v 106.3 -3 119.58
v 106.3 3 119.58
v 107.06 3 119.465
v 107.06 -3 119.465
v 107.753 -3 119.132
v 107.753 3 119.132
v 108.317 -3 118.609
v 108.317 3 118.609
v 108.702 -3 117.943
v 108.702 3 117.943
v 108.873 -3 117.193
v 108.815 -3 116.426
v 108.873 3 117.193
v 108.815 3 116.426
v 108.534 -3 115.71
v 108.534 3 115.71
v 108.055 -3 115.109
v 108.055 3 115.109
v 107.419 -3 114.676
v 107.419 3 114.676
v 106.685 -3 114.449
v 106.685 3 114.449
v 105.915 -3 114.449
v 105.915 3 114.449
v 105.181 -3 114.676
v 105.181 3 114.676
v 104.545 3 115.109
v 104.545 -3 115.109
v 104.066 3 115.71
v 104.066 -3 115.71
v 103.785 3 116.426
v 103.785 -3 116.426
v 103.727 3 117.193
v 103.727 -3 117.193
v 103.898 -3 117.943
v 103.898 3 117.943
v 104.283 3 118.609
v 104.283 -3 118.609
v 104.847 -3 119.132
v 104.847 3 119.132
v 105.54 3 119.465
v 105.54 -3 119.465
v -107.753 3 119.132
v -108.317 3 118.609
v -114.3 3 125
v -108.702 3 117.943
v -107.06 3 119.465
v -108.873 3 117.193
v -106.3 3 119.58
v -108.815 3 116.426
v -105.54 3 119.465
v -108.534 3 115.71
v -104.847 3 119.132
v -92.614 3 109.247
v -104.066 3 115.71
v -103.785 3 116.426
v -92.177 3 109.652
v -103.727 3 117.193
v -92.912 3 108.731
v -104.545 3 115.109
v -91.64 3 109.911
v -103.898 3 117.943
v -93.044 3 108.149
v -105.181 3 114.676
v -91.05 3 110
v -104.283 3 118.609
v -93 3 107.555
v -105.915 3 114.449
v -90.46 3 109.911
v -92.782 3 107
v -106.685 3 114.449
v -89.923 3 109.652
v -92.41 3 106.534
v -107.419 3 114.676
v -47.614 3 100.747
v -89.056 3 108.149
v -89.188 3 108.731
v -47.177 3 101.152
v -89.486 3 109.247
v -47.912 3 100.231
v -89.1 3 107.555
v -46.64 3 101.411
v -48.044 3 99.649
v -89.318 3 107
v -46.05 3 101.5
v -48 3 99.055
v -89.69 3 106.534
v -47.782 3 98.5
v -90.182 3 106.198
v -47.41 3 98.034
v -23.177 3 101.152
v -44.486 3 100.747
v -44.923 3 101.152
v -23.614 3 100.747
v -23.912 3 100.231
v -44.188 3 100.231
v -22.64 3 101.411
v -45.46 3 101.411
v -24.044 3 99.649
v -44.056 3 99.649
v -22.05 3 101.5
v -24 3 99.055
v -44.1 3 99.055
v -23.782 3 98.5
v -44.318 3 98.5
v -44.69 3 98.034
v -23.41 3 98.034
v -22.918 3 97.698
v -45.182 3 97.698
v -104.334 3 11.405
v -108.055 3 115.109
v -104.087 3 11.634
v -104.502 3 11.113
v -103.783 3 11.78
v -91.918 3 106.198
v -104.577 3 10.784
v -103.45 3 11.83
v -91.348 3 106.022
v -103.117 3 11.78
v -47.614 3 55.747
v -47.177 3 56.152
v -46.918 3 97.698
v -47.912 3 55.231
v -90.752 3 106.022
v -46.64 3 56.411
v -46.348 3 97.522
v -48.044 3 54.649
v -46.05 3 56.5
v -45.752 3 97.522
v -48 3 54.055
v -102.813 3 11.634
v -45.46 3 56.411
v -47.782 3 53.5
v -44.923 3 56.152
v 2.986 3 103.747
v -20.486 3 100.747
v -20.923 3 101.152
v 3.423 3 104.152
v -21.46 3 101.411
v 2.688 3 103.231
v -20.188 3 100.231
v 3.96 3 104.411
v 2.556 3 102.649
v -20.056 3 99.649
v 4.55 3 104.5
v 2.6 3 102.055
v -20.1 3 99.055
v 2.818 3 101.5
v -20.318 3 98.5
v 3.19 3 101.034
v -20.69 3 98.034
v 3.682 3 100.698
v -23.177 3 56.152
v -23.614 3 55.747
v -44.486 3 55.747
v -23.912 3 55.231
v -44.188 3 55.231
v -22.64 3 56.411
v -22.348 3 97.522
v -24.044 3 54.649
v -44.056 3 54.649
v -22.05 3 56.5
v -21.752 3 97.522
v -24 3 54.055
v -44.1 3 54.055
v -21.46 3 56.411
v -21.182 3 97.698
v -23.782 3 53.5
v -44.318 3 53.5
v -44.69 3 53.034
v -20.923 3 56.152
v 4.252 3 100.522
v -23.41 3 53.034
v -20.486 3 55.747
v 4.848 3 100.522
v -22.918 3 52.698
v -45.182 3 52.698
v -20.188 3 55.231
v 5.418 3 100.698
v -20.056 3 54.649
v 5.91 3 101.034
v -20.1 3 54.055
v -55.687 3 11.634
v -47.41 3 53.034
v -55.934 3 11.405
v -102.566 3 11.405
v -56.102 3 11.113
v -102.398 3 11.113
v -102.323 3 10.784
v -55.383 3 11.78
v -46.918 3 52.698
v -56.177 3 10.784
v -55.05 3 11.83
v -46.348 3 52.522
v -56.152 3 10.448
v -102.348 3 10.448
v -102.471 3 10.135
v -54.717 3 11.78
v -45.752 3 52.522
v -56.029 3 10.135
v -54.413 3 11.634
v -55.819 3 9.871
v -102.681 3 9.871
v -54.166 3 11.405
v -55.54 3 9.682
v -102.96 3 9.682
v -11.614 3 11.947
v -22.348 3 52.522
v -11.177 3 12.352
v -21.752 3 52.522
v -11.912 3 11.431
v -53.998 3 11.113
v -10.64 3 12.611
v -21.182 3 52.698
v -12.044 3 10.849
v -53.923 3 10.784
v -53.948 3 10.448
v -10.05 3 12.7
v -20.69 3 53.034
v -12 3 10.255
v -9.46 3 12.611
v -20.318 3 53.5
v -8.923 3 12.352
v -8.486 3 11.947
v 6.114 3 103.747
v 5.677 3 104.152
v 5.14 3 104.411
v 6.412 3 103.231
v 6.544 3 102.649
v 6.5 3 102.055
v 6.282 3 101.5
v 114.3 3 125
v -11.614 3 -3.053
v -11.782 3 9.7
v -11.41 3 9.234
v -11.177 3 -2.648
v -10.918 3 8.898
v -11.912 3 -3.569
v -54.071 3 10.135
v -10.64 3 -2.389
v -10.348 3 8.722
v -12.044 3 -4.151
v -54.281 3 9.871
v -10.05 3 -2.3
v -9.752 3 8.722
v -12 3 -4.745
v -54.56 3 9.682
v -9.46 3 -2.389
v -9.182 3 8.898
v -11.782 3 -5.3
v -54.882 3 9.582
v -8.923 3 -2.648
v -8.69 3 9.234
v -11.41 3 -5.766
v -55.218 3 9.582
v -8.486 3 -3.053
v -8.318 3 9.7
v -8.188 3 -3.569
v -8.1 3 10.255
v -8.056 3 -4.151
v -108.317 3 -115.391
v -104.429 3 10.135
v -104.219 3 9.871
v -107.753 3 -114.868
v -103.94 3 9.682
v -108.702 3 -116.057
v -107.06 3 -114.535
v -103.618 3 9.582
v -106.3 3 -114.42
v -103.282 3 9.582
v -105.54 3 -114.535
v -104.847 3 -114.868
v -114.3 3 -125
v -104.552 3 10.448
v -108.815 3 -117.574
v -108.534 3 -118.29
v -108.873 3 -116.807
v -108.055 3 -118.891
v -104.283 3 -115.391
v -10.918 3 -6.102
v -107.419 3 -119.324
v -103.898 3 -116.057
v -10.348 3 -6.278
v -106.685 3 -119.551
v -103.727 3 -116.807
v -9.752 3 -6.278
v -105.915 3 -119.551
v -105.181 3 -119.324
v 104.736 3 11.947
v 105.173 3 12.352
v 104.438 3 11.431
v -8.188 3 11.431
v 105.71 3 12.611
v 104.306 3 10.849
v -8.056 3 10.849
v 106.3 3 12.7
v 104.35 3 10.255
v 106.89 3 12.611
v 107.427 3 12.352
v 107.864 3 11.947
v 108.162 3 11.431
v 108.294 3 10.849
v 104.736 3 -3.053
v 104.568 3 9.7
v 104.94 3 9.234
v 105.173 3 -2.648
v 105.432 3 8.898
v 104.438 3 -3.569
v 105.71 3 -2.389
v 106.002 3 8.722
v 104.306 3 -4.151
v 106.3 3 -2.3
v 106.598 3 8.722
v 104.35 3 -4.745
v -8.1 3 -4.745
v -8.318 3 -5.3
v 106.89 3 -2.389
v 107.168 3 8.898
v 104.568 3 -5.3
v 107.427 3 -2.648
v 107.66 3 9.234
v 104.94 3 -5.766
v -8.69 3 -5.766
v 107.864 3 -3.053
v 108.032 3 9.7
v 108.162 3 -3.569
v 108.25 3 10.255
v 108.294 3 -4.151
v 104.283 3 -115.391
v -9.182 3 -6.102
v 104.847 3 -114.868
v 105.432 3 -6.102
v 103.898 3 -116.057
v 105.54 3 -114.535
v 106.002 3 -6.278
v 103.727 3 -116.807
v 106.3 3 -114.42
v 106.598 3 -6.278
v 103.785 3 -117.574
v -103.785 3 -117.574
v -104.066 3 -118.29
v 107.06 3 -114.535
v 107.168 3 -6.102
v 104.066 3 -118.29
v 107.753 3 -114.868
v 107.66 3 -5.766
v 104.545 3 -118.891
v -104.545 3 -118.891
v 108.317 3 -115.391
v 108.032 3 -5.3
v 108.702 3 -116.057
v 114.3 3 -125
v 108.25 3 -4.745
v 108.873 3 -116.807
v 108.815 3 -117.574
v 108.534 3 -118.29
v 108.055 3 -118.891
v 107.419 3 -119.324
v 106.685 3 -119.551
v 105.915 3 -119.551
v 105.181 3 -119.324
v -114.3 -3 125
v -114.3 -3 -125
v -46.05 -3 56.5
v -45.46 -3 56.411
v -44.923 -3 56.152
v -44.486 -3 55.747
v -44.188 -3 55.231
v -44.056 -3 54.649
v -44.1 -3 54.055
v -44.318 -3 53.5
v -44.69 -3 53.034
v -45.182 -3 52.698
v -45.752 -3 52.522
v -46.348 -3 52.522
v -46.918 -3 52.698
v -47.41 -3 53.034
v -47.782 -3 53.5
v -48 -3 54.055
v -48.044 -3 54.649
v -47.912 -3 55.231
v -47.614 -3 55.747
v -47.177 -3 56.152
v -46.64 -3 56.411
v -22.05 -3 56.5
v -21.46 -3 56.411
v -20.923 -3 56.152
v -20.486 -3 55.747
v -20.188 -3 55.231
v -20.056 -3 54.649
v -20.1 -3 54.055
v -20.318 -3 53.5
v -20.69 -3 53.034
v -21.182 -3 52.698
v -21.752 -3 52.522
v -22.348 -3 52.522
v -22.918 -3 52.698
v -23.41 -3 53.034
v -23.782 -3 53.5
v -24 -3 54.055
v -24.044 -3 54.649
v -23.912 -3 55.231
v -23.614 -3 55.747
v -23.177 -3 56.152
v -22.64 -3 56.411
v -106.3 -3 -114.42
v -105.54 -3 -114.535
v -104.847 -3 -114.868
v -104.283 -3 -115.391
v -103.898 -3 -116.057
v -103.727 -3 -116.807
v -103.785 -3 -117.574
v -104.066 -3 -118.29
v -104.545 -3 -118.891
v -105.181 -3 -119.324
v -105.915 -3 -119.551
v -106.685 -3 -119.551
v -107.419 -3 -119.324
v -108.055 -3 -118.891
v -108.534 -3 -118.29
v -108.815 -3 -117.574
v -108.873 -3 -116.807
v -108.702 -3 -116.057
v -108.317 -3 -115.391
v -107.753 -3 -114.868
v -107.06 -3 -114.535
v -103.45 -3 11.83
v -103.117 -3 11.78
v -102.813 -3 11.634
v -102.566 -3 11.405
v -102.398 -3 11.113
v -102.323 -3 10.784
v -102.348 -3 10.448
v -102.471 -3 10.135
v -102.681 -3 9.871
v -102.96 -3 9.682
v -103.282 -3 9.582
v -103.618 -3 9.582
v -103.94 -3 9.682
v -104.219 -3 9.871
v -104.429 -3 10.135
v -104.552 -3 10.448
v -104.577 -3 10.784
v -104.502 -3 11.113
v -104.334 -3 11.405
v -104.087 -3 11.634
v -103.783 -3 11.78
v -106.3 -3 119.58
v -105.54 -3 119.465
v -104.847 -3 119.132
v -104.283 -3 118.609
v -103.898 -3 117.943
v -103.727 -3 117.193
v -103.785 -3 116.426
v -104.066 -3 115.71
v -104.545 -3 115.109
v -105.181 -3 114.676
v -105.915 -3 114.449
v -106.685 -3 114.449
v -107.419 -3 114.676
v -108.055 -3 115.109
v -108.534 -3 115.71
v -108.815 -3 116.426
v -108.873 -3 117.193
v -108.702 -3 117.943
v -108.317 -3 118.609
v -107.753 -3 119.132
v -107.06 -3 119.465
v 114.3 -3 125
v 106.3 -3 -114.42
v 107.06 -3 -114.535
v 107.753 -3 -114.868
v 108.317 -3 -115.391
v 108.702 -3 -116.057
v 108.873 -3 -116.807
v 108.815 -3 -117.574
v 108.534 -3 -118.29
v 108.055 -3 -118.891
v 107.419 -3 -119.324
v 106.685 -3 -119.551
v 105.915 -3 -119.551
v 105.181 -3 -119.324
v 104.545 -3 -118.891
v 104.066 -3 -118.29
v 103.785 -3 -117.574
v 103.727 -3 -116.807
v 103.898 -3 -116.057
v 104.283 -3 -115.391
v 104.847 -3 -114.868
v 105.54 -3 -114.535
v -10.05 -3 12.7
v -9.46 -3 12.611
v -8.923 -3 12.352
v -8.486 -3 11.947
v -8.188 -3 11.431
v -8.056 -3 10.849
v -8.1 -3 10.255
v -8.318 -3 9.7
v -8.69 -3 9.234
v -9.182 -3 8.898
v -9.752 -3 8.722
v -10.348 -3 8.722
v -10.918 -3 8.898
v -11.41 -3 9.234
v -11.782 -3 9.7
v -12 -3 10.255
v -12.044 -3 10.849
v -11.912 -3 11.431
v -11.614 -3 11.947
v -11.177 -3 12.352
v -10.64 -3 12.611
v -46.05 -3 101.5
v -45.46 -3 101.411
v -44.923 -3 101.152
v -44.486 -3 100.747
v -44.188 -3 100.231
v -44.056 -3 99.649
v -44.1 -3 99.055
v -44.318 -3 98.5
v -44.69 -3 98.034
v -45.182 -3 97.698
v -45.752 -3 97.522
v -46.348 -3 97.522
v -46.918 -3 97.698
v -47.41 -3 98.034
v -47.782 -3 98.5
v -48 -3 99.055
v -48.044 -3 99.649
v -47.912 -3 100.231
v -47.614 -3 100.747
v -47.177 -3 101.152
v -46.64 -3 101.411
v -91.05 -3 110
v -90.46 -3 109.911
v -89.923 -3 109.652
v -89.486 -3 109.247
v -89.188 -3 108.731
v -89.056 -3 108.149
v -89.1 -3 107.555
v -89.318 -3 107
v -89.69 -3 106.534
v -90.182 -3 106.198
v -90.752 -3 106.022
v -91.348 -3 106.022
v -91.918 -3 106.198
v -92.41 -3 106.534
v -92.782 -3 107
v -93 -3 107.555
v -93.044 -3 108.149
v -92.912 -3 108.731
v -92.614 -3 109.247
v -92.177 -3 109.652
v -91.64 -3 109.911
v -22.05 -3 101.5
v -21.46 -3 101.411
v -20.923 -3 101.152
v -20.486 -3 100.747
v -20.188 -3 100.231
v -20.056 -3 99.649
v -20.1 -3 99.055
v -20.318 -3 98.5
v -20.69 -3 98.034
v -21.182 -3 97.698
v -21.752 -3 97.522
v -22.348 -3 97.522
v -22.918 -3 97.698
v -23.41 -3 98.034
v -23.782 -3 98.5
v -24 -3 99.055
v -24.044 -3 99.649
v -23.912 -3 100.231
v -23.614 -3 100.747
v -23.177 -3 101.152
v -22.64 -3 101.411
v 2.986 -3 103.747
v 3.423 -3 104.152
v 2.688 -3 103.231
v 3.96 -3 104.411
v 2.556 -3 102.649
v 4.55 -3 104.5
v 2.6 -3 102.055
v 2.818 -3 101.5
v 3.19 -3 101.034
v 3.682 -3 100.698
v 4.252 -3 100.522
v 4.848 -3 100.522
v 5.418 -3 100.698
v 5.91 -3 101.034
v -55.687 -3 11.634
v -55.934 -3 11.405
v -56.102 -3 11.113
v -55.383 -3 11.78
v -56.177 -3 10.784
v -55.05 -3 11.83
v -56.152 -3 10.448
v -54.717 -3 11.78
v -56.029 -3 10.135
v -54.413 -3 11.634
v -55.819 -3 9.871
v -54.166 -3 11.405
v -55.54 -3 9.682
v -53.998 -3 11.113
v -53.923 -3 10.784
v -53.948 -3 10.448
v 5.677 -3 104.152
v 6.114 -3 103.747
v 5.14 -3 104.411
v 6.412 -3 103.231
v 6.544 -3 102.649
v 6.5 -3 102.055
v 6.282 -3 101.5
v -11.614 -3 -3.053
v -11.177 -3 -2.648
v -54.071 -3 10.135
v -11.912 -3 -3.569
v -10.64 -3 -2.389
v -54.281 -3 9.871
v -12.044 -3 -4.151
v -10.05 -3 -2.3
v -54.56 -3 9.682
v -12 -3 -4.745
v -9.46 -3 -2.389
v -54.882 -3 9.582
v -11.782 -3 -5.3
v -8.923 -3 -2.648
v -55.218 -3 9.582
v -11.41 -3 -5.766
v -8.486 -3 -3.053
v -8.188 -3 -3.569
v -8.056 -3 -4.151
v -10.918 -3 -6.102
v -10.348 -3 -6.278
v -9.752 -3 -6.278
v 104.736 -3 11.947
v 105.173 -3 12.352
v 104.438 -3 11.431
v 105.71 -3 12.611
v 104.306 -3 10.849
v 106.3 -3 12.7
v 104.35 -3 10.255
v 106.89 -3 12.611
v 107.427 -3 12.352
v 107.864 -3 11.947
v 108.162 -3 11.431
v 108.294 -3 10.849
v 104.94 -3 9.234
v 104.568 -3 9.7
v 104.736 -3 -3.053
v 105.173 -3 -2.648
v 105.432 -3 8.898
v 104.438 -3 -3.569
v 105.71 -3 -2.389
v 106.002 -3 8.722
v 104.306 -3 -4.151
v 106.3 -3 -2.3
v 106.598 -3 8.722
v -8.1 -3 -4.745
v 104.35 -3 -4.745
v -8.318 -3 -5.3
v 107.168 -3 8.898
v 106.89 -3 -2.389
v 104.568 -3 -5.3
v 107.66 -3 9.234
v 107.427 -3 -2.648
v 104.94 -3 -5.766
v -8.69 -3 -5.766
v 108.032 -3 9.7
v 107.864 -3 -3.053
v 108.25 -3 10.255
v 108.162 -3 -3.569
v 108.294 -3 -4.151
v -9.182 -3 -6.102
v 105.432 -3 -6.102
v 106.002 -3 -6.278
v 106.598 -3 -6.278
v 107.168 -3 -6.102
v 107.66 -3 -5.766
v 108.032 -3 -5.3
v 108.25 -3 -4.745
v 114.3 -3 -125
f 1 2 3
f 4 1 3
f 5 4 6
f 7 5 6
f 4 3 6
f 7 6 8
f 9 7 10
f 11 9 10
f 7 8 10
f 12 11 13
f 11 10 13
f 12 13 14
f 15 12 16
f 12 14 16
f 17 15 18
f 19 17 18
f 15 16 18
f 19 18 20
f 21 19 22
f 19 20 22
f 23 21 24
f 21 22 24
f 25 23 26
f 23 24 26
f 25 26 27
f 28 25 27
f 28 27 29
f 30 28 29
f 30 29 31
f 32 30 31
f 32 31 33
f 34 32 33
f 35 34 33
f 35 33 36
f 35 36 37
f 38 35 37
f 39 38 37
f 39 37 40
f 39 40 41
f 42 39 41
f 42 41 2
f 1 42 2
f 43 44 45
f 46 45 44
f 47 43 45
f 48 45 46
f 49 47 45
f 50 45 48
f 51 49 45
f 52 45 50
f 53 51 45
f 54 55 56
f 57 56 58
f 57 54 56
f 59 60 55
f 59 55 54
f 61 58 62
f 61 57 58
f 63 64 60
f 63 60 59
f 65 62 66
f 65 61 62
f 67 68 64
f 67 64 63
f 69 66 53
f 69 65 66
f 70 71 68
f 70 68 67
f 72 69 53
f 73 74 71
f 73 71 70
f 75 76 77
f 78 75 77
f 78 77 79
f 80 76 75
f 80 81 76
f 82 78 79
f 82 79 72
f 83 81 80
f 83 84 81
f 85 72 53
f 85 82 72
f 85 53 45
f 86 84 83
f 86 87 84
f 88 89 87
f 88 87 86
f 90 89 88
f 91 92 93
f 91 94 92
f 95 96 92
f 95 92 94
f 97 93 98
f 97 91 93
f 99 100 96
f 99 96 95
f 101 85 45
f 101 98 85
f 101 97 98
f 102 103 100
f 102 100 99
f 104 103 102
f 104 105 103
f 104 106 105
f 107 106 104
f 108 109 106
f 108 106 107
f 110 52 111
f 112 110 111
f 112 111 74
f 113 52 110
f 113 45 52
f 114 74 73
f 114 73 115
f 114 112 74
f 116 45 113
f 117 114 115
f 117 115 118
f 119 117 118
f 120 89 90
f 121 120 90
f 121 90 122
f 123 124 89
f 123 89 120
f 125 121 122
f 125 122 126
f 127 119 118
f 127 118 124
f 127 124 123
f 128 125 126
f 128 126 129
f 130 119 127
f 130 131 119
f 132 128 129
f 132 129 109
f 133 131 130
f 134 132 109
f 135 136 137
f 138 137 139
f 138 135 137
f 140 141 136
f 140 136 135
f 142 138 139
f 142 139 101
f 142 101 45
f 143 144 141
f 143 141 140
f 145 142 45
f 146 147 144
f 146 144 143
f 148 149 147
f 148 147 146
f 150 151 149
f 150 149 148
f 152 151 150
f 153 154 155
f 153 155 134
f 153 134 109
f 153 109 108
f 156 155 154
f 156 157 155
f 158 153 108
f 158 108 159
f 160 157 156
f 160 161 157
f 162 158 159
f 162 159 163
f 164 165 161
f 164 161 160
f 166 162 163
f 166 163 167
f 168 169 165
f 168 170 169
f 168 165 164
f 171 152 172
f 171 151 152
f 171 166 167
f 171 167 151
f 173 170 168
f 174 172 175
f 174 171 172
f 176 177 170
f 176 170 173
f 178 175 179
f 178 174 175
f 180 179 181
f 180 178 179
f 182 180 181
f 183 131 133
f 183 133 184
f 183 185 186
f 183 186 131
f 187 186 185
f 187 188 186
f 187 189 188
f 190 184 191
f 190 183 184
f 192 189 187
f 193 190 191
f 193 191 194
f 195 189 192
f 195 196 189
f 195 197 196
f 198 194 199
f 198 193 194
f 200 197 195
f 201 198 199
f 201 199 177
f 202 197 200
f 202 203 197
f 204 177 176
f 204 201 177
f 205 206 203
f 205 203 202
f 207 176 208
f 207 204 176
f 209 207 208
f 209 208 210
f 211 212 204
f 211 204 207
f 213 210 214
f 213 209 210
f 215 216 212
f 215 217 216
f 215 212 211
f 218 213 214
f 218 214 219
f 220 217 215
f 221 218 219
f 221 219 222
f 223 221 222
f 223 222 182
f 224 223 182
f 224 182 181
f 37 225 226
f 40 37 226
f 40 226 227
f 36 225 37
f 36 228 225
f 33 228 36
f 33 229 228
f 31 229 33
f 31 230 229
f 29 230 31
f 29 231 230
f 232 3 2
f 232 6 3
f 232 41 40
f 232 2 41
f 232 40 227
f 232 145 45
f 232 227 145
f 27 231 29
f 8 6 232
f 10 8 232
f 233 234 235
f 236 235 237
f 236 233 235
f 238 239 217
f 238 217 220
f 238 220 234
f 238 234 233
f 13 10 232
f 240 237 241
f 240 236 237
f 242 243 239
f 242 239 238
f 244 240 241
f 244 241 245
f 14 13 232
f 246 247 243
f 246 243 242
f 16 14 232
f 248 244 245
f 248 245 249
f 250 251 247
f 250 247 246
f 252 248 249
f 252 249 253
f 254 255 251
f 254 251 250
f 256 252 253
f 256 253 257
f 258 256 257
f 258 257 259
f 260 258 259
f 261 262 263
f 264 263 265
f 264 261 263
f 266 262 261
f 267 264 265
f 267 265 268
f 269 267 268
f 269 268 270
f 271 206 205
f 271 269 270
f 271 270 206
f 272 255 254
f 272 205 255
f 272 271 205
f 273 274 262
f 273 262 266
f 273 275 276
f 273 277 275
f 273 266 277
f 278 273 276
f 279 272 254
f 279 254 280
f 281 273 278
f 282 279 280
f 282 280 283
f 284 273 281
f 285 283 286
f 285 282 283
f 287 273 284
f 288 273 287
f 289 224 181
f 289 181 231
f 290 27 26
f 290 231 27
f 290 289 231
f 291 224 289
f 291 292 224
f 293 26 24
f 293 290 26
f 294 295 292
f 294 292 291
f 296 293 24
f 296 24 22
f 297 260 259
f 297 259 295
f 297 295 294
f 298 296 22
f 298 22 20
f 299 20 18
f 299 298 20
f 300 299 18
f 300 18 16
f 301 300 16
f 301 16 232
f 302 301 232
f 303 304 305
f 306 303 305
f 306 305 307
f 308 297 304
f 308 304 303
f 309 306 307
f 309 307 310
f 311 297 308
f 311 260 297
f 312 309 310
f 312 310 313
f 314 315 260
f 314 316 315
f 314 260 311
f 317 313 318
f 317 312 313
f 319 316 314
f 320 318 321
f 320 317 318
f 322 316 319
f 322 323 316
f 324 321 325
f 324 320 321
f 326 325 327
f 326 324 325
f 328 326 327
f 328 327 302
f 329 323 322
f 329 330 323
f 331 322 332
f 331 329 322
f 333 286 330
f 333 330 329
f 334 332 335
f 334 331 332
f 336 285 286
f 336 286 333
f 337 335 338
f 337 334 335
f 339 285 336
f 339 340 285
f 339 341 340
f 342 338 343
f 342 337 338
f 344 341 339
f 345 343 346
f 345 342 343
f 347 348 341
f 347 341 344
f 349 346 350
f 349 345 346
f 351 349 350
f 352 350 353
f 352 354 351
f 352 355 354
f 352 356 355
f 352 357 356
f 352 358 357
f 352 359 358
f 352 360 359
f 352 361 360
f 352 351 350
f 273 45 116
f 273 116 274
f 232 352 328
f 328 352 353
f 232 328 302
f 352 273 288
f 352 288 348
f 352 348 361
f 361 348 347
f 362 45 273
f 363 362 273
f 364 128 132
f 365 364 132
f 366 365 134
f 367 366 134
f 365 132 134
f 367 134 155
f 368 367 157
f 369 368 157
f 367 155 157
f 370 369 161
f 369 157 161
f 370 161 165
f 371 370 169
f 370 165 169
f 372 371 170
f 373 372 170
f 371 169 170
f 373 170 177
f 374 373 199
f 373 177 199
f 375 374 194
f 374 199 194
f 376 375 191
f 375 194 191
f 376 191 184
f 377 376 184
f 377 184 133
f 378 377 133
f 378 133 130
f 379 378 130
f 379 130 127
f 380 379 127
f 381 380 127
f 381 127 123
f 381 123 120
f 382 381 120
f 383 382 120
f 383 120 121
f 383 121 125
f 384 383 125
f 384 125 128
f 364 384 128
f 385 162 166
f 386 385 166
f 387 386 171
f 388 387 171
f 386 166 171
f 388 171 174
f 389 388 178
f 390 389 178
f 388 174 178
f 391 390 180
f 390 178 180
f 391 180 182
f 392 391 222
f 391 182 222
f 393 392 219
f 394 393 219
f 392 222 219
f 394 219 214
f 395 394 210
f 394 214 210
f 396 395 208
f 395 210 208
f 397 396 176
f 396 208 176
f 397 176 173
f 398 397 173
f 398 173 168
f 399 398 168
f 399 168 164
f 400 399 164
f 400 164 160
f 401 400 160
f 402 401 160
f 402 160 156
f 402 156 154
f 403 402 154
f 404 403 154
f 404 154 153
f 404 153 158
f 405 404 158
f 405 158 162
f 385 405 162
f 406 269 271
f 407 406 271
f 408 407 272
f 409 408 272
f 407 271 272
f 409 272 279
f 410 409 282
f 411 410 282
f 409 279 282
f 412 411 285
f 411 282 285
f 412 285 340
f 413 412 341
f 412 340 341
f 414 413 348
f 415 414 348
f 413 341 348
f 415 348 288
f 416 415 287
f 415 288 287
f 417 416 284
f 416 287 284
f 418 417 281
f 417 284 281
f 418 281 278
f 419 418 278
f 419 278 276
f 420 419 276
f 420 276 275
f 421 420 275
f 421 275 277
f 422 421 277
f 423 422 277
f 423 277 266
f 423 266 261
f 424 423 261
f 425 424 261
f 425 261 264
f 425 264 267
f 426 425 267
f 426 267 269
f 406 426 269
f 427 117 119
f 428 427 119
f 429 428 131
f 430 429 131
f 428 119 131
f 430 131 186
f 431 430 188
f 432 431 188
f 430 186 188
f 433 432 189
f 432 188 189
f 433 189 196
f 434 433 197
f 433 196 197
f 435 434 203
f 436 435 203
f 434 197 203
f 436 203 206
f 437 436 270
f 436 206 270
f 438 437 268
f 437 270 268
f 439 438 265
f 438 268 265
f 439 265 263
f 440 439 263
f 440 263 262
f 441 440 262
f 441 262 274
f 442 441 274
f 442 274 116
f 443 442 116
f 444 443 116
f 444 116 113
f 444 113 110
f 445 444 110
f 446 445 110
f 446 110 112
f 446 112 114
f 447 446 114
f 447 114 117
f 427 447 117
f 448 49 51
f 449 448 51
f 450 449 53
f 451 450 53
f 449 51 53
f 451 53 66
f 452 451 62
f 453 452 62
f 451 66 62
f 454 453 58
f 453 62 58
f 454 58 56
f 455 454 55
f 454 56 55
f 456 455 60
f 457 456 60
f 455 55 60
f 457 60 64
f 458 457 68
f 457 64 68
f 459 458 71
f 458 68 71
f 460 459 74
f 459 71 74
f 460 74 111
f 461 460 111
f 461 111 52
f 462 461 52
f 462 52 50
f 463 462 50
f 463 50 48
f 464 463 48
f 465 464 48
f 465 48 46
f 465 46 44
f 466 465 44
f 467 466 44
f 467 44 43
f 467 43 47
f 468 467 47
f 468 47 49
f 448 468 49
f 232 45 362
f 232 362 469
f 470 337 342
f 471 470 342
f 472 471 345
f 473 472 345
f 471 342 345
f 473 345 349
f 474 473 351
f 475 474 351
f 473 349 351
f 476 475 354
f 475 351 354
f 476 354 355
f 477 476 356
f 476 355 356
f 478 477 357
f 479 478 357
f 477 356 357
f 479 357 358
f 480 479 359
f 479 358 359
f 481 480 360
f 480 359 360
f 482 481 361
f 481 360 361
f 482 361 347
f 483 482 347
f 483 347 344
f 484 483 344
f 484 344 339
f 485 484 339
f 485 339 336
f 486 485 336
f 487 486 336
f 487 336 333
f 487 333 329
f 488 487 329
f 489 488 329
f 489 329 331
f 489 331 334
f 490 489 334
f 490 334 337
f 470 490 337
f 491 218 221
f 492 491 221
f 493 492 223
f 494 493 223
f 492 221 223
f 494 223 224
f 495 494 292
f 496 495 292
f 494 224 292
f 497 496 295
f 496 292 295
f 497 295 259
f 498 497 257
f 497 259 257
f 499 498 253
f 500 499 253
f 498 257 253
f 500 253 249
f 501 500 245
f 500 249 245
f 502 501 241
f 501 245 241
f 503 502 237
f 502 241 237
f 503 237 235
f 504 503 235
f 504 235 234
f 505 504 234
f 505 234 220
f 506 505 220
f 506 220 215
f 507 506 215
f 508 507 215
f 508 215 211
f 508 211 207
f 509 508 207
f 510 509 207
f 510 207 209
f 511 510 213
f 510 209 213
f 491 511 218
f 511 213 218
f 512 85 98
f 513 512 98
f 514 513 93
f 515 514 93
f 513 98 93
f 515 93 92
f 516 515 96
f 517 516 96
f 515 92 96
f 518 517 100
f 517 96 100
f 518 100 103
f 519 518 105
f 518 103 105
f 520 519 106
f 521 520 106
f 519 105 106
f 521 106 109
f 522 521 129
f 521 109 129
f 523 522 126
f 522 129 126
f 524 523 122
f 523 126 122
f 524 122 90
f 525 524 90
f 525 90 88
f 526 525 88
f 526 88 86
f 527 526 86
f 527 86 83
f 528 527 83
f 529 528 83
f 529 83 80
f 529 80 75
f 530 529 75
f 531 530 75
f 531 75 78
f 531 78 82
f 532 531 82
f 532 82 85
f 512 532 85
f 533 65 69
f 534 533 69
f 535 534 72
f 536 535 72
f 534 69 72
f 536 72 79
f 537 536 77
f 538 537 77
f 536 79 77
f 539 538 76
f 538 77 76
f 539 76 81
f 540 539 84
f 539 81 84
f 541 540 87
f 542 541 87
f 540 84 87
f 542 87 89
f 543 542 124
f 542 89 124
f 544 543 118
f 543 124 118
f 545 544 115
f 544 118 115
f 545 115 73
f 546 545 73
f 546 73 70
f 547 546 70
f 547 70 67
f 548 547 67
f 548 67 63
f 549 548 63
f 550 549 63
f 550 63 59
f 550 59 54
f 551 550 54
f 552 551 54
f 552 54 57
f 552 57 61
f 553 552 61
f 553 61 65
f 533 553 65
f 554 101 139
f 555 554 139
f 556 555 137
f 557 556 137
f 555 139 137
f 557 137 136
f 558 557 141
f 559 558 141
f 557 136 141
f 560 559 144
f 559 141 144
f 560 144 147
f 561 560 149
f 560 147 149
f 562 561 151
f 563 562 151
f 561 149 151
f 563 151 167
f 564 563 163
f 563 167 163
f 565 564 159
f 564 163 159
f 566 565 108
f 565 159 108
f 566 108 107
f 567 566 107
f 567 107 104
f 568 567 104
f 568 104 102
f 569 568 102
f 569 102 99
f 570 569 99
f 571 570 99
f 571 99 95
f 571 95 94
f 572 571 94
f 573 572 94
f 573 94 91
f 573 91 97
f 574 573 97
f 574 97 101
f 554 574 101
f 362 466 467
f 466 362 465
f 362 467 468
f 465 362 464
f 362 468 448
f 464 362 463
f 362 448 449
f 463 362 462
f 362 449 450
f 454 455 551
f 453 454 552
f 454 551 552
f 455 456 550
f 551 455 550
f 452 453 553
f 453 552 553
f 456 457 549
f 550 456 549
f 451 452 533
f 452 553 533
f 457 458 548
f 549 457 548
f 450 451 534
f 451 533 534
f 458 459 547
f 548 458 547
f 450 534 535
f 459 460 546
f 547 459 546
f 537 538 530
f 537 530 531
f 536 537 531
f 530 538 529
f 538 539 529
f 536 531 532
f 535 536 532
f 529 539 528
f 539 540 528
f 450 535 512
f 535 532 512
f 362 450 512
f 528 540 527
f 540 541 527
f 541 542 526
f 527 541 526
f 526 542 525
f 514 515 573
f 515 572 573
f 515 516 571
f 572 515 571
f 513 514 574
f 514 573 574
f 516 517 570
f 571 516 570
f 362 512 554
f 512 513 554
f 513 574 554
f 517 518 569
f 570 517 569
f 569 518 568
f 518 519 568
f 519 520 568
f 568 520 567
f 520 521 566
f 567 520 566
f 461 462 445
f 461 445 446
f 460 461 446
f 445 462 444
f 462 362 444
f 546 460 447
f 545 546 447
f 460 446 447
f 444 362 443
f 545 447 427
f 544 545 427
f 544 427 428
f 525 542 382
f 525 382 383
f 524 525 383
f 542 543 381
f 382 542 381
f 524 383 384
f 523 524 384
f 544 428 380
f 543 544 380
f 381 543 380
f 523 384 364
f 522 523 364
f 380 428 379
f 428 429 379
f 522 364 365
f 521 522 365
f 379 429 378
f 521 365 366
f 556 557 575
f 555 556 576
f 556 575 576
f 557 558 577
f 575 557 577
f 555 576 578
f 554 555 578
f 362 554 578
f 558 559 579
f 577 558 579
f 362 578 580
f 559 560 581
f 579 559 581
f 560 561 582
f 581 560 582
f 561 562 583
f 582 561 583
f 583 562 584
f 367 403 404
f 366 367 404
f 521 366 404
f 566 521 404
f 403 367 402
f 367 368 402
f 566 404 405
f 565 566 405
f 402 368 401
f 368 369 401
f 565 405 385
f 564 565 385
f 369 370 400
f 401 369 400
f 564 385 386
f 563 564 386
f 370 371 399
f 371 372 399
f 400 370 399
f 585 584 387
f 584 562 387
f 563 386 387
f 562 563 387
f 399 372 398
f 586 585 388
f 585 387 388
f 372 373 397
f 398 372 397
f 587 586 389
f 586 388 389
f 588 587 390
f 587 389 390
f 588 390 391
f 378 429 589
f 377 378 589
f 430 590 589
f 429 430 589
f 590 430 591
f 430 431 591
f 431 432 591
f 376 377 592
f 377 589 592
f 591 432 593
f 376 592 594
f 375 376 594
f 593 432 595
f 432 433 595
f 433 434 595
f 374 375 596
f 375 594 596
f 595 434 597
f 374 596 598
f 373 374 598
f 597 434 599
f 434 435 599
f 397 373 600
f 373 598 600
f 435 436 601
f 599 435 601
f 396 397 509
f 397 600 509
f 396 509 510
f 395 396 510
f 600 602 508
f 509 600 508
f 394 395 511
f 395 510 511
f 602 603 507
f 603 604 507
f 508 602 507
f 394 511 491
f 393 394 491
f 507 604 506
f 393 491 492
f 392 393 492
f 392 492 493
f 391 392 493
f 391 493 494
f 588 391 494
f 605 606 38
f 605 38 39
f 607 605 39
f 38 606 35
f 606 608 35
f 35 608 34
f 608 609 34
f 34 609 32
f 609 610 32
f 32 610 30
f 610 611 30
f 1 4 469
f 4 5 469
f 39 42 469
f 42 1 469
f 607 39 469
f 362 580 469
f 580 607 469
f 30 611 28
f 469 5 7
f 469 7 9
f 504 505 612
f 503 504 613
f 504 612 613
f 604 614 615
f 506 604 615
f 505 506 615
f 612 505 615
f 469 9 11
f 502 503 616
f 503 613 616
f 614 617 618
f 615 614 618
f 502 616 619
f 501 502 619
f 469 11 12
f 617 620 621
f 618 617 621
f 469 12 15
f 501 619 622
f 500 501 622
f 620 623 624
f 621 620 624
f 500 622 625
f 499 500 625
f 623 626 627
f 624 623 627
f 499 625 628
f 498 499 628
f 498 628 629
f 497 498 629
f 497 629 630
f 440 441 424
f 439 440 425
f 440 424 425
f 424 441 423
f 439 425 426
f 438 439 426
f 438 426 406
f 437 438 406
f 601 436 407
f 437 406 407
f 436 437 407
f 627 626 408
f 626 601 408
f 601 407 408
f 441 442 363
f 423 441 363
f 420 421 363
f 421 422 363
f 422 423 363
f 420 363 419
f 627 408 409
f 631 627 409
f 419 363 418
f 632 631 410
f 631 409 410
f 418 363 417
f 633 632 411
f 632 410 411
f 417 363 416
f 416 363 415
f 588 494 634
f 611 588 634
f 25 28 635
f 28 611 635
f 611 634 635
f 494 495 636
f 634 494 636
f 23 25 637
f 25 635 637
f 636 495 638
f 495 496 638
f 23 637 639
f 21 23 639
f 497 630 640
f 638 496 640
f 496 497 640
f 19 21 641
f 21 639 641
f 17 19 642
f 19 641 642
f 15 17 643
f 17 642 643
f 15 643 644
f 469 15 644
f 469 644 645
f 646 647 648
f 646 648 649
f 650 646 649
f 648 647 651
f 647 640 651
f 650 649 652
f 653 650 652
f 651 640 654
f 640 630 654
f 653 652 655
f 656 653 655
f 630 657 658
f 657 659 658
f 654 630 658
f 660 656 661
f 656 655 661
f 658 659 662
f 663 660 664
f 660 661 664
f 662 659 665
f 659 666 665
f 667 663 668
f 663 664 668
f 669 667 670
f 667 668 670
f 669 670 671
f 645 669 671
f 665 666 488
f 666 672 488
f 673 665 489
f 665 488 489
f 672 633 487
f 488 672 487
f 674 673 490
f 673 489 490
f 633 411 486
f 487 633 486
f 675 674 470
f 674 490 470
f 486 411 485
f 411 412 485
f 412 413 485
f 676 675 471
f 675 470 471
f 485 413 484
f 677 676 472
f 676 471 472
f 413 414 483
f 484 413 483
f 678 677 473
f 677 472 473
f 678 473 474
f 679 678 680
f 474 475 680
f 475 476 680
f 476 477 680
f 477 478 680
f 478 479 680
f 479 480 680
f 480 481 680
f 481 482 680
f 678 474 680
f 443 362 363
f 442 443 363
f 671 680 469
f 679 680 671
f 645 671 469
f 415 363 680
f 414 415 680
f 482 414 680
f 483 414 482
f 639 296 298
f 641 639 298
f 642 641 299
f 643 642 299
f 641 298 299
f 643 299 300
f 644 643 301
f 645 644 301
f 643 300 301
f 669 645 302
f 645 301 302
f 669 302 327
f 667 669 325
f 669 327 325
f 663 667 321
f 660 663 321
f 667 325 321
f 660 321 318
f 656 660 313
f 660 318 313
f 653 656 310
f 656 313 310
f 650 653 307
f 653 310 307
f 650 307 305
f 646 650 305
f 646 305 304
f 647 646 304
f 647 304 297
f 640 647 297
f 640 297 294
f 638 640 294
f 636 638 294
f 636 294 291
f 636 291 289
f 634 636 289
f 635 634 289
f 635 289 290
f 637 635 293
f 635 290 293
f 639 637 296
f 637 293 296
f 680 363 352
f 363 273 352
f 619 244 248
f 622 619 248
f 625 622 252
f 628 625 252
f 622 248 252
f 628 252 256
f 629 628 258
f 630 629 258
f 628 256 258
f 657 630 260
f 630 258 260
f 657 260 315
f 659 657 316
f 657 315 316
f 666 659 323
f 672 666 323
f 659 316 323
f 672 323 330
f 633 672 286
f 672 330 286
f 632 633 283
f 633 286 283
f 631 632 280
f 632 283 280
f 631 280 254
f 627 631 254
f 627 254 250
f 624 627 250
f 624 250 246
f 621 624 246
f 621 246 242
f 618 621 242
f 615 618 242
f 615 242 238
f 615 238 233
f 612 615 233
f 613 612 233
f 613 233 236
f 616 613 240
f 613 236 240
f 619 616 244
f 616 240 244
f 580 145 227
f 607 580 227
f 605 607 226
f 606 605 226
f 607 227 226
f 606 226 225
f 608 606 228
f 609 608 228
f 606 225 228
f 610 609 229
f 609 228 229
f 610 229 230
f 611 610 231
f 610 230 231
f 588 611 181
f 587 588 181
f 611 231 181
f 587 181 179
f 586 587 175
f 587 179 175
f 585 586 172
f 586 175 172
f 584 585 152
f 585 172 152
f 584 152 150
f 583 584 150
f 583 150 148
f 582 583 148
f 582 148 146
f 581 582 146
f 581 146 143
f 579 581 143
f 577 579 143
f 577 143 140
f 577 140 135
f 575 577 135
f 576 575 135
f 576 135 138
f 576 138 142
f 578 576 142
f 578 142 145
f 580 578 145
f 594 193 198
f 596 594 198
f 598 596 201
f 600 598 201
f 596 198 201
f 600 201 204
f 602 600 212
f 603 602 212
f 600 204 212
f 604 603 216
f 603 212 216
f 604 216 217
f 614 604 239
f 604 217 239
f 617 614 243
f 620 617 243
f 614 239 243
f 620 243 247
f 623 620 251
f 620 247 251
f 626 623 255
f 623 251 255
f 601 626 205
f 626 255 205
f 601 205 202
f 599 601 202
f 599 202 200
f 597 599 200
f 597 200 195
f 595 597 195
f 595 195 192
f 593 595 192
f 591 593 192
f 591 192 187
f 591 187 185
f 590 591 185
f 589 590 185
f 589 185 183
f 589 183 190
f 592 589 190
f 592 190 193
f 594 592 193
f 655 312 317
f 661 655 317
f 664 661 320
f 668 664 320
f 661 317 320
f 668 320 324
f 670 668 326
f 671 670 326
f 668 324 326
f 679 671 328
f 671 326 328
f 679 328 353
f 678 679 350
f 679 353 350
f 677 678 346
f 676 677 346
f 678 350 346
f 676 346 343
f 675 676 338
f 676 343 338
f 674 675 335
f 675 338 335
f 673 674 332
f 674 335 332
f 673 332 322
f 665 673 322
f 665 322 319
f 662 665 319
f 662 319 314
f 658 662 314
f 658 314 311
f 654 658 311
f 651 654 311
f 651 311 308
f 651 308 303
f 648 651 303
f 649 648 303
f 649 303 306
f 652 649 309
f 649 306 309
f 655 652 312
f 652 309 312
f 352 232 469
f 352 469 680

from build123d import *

# Parameters (mm, degrees)
SKETCH1_W                      = 228.6
SKETCH1_H                      = 250
PLATE_DEPTH                    = 3
SKETCH2_R                      = 2
MUX_BRACKET_HOLES_DEPTH        = 6
MUX_BRACKET_PATTERN_COUNT      = 2
MUX_BRACKET_PATTERN_PITCH      = 116.35
SKETCH3_R                      = 2
PUMP_STAND_HOLE_DEPTH          = 170.48595812
PUMP_STAND_PATTERN_COUNT       = 2
PUMP_STAND_PATTERN_PITCH       = 24
PUMP_STAND_PATTERN_COUNT_DIR2  = 2
PUMP_STAND_PATTERN_PITCH_DIR2  = 45
SKETCH4_R                      = 2
PUMP_INPUT_STAND_HOLE_DEPTH    = 170.48595812
SKETCH5_R                      = 2
CROSS_FITTING_STAND_HOLE_DEPTH = 170.48595812
SKETCH6_R                      = 2.58
STANDOFF_HOLES_DEPTH           = 170.48595812
SKETCH7_R                      = 1.1303
ARDUINO_HOLES_DEPTH            = 10


with BuildPart() as part:
    # Sketch1 → PLATE (new, symmetric)
    with BuildSketch(Plane(origin=(0, 0, 0), x_dir=(1, 0, 0), z_dir=(0, 1, 0))):
        Rectangle(SKETCH1_W, SKETCH1_H)
    extrude(amount=PLATE_DEPTH, both=True)

    # Sketch2 → MUX_BRACKET_HOLES (cut)
    with BuildSketch(Plane(origin=(0, 3, 0), x_dir=(1, 0, 0), z_dir=(0, 1, 0))):
        with Locations(Location((106.3, -10.7, 0), (0, 0, 270))):
            Circle(SKETCH2_R)
        with Locations(Location((106.3, 4.3, 0), (0, 0, 270))):
            Circle(SKETCH2_R)
    mux_bracket_holes = extrude(amount=-MUX_BRACKET_HOLES_DEPTH, mode=Mode.SUBTRACT)

    # MUX_BRACKET_PATTERN: MUX_BRACKET_HOLES ×2
    with Locations(*[(-i * MUX_BRACKET_PATTERN_PITCH, 0, 0) for i in range(1, MUX_BRACKET_PATTERN_COUNT)]):
        add(mux_bracket_holes, mode=Mode.SUBTRACT)

    # Sketch3 → PUMP_STAND_HOLE (cut, through all)
    with BuildSketch(Plane(origin=(0, 3, 0), x_dir=(1, 0, 0), z_dir=(0, 1, 0))):
        with Locations(Location((-22.05, -54.5, 0), (0, 0, 270))):
            Circle(SKETCH3_R)
    pump_stand_hole = extrude(amount=-PUMP_STAND_HOLE_DEPTH, mode=Mode.SUBTRACT)

    # PUMP_STAND_PATTERN: PUMP_STAND_HOLE 2 × 2
    with Locations(*[(-i * PUMP_STAND_PATTERN_PITCH, 0, j * PUMP_STAND_PATTERN_PITCH_DIR2) for i in range(PUMP_STAND_PATTERN_COUNT) for j in range(PUMP_STAND_PATTERN_COUNT_DIR2) if (i, j) != (0, 0)]):
        add(pump_stand_hole, mode=Mode.SUBTRACT)

    # Sketch4 → PUMP_INPUT_STAND_HOLE (cut, through all)
    with BuildSketch(Plane(origin=(0, 3, 0), x_dir=(1, 0, 0), z_dir=(0, 1, 0))):
        with Locations(Location((4.55, -102.5, 0), (0, 0, 270))):
            Circle(SKETCH4_R)
    extrude(amount=-PUMP_INPUT_STAND_HOLE_DEPTH, mode=Mode.SUBTRACT)

    # Sketch5 → CROSS_FITTING_STAND_HOLE (cut, through all)
    with BuildSketch(Plane(origin=(0, 3, 0), x_dir=(1, 0, 0), z_dir=(0, 1, 0))):
        with Locations(Location((-91.05, -108, 0), (0, 0, 270))):
            Circle(SKETCH5_R)
    extrude(amount=-CROSS_FITTING_STAND_HOLE_DEPTH, mode=Mode.SUBTRACT)

    # Sketch6 → STANDOFF_HOLES (cut, through all)
    with BuildSketch(Plane(origin=(0, 3, 0), x_dir=(1, 0, 0), z_dir=(0, 1, 0))):
        with Locations(Location((-106.3, -117, 0), (0, 0, 270))):
            Circle(SKETCH6_R)
        with Locations(Location((106.3, -117, 0), (0, 0, 270))):
            Circle(SKETCH6_R)
        with Locations(Location((106.3, 117, 0), (0, 0, 270))):
            Circle(SKETCH6_R)
        with Locations(Location((-106.3, 117, 0), (0, 0, 270))):
            Circle(SKETCH6_R)
    extrude(amount=-STANDOFF_HOLES_DEPTH, mode=Mode.SUBTRACT)

    # Sketch7 → ARDUINO_HOLES (cut)
    with BuildSketch(Plane(origin=(0, 3, 0), x_dir=(1, 0, 0), z_dir=(0, 1, 0))):
        with Locations(Location((-103.45, -10.7, 0), (0, 0, 270))):
            Circle(SKETCH7_R)
        with Locations(Location((-55.05, -10.7, 0), (0, 0, 270))):
            Circle(SKETCH7_R)
    extrude(amount=-ARDUINO_HOLES_DEPTH, mode=Mode.SUBTRACT)


solid = part.part
